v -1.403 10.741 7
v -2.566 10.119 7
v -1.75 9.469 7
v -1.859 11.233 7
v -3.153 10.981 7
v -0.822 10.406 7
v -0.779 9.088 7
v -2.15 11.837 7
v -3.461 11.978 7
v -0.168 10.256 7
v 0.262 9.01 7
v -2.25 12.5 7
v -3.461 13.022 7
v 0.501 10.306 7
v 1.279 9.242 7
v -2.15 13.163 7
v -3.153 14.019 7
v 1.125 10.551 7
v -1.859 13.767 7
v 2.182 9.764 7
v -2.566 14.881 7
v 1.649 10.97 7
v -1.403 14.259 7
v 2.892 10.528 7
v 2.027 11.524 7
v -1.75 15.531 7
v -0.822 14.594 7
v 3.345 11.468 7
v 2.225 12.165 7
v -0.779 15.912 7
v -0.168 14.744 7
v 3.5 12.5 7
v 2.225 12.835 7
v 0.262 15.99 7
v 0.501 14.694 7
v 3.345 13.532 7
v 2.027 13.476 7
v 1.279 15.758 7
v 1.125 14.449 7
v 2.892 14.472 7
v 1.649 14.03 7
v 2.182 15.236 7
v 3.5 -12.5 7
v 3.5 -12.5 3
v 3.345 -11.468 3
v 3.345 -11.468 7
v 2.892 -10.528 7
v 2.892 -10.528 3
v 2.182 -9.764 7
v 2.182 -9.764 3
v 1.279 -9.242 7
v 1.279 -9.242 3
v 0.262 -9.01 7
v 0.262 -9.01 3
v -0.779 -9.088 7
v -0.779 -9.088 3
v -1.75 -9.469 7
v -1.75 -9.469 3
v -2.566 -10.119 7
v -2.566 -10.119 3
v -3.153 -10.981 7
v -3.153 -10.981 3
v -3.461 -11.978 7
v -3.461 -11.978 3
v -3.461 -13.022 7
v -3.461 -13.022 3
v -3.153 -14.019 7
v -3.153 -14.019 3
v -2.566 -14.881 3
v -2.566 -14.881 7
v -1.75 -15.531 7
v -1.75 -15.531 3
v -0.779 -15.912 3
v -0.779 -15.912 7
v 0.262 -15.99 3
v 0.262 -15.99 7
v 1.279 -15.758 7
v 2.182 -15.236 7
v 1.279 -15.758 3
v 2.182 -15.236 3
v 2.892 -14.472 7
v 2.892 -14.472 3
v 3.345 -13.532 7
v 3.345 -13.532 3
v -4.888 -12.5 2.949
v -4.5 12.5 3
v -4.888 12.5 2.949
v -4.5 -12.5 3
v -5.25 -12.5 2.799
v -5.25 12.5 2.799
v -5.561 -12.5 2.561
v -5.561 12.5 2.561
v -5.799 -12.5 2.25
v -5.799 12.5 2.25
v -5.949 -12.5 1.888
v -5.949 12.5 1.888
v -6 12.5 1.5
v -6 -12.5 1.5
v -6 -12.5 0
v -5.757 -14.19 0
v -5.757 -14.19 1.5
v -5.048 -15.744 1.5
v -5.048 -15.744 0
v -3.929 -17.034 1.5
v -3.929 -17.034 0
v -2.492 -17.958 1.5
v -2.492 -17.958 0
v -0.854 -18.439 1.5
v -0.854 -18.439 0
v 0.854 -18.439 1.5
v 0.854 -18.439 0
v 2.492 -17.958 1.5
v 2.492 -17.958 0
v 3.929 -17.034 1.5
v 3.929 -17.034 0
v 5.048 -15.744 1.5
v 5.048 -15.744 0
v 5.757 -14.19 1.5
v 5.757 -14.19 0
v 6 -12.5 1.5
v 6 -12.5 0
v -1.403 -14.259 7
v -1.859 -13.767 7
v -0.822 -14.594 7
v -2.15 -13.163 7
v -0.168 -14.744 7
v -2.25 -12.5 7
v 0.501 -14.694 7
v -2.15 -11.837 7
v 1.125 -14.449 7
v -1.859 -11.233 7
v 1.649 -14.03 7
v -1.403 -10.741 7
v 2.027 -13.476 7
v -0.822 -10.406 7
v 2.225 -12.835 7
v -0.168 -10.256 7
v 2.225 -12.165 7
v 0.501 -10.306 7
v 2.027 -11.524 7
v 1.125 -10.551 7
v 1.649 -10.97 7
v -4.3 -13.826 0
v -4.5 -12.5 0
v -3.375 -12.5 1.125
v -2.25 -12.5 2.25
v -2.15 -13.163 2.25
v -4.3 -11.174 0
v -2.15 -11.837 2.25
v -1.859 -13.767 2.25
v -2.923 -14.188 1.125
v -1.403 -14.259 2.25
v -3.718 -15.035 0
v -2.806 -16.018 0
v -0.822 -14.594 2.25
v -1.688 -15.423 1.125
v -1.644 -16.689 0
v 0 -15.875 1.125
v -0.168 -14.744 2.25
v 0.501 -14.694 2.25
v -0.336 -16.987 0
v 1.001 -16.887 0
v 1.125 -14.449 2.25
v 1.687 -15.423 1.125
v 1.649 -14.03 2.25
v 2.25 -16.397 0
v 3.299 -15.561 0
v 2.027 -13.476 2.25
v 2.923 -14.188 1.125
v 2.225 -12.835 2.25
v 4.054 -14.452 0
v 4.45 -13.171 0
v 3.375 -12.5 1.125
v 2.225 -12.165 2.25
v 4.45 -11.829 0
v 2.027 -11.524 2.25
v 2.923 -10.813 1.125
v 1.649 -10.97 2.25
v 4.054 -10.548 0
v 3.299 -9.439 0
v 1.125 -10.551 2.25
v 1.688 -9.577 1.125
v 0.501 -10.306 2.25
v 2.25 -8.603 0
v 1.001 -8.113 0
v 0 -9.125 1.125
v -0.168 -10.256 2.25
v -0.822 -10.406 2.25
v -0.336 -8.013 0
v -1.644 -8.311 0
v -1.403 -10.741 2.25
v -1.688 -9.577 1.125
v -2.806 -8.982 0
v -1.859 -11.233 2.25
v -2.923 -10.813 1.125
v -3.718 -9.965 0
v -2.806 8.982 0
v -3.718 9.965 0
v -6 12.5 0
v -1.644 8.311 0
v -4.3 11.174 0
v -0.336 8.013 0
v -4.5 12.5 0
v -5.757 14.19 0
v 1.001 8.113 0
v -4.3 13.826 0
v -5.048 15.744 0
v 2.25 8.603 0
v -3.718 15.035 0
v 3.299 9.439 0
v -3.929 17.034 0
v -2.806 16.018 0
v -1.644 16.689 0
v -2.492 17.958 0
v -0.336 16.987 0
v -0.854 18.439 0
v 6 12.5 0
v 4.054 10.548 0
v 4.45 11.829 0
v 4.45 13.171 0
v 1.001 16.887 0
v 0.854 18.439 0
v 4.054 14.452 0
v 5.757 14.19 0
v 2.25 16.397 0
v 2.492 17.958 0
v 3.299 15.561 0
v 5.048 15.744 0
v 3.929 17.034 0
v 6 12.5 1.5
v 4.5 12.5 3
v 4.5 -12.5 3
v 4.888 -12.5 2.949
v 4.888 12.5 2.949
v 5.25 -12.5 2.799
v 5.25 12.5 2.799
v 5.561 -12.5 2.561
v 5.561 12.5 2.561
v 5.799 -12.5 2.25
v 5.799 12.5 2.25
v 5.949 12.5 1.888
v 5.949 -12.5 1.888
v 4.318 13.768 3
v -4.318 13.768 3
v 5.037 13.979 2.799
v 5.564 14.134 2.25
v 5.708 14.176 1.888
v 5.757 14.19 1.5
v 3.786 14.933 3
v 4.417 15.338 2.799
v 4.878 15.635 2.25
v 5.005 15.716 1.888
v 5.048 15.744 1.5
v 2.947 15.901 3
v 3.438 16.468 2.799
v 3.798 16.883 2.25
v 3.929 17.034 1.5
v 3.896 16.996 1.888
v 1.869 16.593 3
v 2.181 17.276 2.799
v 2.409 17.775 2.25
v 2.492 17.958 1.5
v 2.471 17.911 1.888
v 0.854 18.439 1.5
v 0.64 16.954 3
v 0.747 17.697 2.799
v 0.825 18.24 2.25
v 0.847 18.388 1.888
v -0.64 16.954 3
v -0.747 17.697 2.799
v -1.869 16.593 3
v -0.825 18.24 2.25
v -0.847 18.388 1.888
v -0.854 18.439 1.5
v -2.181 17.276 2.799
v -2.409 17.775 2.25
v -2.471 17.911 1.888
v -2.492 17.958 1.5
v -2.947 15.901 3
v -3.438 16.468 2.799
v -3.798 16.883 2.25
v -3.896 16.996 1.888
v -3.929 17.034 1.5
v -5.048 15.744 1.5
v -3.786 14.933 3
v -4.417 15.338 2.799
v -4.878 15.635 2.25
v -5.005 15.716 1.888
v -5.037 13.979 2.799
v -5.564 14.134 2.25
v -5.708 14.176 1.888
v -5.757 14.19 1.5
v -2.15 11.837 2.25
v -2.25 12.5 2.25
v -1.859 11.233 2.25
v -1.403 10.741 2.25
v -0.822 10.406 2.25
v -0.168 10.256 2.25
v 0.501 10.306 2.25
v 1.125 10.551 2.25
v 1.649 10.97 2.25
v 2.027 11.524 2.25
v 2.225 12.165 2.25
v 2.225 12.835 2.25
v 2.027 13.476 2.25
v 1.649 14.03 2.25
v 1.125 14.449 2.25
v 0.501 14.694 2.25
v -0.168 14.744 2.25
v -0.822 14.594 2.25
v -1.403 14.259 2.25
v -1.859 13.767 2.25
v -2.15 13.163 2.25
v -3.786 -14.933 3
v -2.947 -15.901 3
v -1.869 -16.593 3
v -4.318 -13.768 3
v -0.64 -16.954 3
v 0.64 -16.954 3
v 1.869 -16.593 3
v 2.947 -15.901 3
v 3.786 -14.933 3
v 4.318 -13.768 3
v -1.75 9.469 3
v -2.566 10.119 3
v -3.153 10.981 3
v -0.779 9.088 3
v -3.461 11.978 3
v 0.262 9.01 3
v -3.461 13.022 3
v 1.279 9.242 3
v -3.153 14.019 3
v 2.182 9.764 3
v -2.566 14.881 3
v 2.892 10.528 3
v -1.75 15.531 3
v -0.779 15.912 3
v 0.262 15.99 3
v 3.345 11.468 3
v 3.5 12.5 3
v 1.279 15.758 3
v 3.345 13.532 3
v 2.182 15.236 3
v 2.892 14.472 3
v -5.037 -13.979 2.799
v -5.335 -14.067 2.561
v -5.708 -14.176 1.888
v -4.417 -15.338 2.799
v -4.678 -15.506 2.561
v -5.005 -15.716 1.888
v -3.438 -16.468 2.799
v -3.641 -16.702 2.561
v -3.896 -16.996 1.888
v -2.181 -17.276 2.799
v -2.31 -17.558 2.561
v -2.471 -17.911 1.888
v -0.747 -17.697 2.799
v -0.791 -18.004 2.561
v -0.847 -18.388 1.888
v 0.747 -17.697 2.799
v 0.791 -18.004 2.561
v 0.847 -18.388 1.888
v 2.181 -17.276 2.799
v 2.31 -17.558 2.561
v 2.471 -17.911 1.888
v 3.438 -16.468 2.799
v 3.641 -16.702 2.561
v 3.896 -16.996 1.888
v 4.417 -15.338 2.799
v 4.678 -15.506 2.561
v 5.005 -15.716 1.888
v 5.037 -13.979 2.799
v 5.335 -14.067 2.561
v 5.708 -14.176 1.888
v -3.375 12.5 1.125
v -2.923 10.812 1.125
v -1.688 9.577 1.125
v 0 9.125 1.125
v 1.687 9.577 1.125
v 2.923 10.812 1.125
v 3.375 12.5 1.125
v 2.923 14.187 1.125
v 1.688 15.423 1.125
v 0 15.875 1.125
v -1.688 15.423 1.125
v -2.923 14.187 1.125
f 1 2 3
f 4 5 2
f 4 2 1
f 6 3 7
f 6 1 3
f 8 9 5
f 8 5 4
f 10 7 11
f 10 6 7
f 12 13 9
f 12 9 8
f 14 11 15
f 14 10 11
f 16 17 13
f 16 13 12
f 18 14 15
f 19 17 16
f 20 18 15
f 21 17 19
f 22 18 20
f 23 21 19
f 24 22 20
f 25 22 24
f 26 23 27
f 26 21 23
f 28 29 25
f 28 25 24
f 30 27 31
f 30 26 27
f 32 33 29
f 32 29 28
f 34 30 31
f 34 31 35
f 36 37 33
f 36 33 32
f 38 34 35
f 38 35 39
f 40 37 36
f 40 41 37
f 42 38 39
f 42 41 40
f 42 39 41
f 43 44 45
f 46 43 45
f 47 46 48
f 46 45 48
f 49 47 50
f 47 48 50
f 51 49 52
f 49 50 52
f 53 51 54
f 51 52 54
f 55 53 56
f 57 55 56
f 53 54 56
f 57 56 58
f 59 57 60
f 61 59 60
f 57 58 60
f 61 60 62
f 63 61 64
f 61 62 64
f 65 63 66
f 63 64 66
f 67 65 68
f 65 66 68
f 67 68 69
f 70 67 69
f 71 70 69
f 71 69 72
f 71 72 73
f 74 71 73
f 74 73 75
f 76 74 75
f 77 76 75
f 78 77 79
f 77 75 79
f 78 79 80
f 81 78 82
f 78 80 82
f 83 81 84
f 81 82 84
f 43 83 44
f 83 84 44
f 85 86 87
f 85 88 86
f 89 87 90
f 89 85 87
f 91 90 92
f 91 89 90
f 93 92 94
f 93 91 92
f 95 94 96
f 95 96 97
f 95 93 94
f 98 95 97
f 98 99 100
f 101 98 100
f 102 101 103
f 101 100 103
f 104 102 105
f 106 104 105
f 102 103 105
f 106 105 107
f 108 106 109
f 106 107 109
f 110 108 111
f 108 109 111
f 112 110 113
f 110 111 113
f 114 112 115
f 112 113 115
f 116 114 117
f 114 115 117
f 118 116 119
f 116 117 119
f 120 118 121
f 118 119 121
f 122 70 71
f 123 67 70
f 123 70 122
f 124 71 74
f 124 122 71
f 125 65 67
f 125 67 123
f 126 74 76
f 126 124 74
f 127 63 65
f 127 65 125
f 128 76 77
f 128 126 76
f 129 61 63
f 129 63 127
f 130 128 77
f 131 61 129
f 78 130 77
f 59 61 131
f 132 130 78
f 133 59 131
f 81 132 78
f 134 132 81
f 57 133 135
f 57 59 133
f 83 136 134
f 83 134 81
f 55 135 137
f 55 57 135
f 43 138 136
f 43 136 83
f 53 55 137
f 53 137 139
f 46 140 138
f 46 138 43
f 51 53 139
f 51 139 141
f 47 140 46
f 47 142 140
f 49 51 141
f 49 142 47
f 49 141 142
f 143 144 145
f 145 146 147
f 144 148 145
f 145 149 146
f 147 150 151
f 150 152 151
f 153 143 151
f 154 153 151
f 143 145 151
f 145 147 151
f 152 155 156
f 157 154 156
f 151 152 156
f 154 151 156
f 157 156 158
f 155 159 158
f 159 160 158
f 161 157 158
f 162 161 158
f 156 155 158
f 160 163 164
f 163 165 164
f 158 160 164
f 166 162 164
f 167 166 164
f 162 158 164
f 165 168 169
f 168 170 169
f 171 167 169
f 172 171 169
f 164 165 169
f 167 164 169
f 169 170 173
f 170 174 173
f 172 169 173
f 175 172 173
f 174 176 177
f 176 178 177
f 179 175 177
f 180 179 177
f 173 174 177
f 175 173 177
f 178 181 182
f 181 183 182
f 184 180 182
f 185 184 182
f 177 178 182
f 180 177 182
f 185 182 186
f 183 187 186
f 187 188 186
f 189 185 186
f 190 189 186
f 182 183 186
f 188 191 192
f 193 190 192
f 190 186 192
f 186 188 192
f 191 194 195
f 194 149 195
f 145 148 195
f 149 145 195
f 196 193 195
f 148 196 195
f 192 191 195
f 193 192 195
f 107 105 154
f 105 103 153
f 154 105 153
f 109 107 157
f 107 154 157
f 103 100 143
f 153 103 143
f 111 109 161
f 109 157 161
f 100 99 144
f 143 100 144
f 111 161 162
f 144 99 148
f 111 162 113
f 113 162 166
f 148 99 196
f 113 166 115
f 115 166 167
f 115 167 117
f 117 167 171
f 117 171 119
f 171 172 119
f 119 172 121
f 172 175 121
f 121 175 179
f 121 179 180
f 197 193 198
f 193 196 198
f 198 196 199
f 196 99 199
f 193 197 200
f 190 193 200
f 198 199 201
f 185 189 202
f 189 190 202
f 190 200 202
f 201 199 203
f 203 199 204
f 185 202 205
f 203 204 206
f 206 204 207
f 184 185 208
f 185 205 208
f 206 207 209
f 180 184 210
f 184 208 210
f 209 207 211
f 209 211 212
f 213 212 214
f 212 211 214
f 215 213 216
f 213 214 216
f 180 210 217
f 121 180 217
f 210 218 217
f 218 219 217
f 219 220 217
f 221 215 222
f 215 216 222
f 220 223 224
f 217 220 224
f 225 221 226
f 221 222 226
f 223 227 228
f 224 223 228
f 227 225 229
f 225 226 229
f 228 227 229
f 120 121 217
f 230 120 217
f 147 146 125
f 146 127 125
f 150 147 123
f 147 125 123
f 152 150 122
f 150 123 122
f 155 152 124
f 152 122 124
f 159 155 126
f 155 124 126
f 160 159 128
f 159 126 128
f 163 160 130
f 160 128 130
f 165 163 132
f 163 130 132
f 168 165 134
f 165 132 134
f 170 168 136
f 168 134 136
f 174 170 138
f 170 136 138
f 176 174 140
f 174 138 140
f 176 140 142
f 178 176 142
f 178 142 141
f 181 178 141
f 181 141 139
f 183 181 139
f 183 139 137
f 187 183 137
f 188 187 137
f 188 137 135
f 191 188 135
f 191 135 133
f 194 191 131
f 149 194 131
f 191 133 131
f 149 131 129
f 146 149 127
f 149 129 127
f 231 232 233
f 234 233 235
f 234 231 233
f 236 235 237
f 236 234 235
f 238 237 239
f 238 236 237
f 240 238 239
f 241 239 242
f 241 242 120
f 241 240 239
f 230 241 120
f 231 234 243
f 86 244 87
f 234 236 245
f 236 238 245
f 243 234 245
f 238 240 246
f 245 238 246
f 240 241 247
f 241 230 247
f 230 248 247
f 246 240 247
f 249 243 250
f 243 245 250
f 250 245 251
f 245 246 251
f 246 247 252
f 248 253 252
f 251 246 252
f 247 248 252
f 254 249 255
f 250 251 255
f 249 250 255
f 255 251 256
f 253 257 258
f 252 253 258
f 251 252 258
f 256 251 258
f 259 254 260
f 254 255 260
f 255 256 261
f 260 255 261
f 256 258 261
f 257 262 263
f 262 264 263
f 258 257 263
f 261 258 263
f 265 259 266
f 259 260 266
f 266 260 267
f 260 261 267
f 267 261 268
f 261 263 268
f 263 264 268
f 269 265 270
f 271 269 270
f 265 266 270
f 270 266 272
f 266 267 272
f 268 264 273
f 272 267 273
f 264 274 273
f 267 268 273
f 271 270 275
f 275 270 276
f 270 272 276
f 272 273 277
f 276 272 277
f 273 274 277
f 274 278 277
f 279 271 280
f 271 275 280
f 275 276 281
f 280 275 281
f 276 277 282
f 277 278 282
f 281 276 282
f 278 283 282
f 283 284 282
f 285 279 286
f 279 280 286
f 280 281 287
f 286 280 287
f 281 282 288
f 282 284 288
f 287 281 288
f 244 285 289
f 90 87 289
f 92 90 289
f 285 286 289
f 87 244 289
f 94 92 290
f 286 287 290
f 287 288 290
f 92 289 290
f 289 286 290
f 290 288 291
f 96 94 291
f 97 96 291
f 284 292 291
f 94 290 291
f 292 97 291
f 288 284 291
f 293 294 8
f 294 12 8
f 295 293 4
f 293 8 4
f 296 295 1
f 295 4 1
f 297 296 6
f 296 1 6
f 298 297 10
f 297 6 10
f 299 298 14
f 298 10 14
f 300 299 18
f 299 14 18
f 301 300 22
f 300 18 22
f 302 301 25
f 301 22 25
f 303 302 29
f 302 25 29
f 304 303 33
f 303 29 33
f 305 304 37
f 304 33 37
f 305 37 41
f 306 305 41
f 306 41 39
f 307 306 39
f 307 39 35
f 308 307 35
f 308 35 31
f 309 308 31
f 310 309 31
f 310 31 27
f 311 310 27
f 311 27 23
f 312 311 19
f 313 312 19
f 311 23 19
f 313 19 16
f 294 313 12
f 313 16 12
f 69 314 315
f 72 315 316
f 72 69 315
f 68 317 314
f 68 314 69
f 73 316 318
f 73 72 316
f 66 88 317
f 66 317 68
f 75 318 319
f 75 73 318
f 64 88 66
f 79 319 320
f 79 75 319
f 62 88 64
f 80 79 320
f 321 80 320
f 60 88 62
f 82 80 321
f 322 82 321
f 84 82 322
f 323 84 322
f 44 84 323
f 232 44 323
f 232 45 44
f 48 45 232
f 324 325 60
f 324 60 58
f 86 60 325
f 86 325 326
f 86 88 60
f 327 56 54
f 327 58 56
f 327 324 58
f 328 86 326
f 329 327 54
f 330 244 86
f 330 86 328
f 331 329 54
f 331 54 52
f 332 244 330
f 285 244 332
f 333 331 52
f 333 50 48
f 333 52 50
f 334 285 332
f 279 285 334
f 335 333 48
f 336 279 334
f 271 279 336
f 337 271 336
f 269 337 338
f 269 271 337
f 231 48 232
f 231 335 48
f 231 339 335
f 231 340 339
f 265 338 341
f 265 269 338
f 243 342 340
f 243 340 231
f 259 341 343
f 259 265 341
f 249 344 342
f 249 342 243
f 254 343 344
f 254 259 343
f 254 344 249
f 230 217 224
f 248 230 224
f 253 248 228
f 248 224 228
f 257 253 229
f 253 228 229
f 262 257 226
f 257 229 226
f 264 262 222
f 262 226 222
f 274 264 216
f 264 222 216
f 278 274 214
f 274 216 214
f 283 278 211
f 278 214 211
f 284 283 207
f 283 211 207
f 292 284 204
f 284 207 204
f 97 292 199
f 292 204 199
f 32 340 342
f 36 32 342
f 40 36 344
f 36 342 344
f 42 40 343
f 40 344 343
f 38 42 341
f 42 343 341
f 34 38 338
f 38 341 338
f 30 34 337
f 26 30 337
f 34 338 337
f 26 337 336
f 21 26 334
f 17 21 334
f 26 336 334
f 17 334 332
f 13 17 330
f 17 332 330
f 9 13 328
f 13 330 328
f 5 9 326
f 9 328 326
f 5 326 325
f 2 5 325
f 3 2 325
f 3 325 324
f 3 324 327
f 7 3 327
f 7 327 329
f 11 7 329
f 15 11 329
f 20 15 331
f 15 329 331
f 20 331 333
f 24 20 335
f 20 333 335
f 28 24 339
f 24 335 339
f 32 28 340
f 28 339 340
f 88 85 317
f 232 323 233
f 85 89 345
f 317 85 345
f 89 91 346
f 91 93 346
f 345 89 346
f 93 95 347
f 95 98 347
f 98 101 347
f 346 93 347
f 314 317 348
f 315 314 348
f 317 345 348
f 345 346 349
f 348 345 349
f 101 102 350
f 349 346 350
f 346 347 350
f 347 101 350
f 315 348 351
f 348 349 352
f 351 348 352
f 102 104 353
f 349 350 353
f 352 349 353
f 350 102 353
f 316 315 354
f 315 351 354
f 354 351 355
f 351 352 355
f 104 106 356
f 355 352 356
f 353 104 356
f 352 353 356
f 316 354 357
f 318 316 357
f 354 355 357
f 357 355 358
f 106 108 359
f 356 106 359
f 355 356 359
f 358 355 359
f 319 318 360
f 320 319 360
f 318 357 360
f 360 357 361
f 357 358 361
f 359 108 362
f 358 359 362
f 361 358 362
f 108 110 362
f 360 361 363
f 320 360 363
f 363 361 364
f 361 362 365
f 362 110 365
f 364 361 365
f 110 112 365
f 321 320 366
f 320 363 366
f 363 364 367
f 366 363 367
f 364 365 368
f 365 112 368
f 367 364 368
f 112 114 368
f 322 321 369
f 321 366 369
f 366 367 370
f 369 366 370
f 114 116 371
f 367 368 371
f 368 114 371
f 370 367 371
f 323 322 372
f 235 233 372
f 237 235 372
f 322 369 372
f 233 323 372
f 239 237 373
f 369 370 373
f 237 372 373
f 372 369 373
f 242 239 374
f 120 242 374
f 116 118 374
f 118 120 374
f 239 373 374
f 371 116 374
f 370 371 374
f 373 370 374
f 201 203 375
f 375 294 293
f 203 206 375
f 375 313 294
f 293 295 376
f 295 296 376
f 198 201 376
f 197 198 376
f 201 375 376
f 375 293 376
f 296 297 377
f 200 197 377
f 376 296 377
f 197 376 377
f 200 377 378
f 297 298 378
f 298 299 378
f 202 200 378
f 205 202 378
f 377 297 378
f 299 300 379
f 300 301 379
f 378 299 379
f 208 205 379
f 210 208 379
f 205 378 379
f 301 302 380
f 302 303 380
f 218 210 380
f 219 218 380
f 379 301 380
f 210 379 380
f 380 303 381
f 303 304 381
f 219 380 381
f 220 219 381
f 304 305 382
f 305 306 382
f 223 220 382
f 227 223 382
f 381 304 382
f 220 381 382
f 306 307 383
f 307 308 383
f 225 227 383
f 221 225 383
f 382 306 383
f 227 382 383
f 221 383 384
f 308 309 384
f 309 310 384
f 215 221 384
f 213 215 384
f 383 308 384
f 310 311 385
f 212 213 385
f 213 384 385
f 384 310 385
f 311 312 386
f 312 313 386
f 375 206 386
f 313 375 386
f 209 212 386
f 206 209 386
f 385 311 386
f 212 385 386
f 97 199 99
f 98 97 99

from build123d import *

# Parameters (mm, degrees)
F1_DEPTH       = 3
F2_R           = 3.5
F3_DEPTH       = 4
F5_D           = 4.5
F5_CSINK_D     = 9
F5_CSINK_ANGLE = 90
F6_R           = 1.5


# Not quite as in the source:
# - a feature names something its author has since deleted; it is built from what else it names


with BuildPart() as f1:
    # F0 (on Top) → F1 (new body)
    with BuildSketch(Plane.XY):
        with BuildLine():
            ThreePointArc((6, 12.5), (0, 18.5), (-6, 12.5))
            Line((-6, 12.5), (-6, -12.5))
            ThreePointArc((-6, -12.5), (0, -18.5), (6, -12.5))
            Line((6, -12.5), (6, 12.5))
        make_face()
    extrude(amount=F1_DEPTH)

    # F2 (on face) → F3 (join)
    with BuildSketch(Plane.XY.offset(3)):
        with Locations((0, -12.5)):
            Circle(F2_R)
        with Locations((0, 12.5)):
            Circle(F2_R)
    extrude(amount=F3_DEPTH)

    # F5 (through all)
    with Locations(Plane(origin=(0, 0, 0), x_dir=(1, 0, 0), z_dir=(0, 0, -1))):
        with Locations((0, 12.5), (0, -12.5)):
            CounterSinkHole(F5_D / 2, F5_CSINK_D / 2, counter_sink_angle=F5_CSINK_ANGLE)

    # F6
    f6_edges = [f1.edges().sort_by_distance(p)[0] for p in [
        (-6, 0, 3),
    ]]
    fillet(f6_edges, radius=F6_R)


solid = f1.part
